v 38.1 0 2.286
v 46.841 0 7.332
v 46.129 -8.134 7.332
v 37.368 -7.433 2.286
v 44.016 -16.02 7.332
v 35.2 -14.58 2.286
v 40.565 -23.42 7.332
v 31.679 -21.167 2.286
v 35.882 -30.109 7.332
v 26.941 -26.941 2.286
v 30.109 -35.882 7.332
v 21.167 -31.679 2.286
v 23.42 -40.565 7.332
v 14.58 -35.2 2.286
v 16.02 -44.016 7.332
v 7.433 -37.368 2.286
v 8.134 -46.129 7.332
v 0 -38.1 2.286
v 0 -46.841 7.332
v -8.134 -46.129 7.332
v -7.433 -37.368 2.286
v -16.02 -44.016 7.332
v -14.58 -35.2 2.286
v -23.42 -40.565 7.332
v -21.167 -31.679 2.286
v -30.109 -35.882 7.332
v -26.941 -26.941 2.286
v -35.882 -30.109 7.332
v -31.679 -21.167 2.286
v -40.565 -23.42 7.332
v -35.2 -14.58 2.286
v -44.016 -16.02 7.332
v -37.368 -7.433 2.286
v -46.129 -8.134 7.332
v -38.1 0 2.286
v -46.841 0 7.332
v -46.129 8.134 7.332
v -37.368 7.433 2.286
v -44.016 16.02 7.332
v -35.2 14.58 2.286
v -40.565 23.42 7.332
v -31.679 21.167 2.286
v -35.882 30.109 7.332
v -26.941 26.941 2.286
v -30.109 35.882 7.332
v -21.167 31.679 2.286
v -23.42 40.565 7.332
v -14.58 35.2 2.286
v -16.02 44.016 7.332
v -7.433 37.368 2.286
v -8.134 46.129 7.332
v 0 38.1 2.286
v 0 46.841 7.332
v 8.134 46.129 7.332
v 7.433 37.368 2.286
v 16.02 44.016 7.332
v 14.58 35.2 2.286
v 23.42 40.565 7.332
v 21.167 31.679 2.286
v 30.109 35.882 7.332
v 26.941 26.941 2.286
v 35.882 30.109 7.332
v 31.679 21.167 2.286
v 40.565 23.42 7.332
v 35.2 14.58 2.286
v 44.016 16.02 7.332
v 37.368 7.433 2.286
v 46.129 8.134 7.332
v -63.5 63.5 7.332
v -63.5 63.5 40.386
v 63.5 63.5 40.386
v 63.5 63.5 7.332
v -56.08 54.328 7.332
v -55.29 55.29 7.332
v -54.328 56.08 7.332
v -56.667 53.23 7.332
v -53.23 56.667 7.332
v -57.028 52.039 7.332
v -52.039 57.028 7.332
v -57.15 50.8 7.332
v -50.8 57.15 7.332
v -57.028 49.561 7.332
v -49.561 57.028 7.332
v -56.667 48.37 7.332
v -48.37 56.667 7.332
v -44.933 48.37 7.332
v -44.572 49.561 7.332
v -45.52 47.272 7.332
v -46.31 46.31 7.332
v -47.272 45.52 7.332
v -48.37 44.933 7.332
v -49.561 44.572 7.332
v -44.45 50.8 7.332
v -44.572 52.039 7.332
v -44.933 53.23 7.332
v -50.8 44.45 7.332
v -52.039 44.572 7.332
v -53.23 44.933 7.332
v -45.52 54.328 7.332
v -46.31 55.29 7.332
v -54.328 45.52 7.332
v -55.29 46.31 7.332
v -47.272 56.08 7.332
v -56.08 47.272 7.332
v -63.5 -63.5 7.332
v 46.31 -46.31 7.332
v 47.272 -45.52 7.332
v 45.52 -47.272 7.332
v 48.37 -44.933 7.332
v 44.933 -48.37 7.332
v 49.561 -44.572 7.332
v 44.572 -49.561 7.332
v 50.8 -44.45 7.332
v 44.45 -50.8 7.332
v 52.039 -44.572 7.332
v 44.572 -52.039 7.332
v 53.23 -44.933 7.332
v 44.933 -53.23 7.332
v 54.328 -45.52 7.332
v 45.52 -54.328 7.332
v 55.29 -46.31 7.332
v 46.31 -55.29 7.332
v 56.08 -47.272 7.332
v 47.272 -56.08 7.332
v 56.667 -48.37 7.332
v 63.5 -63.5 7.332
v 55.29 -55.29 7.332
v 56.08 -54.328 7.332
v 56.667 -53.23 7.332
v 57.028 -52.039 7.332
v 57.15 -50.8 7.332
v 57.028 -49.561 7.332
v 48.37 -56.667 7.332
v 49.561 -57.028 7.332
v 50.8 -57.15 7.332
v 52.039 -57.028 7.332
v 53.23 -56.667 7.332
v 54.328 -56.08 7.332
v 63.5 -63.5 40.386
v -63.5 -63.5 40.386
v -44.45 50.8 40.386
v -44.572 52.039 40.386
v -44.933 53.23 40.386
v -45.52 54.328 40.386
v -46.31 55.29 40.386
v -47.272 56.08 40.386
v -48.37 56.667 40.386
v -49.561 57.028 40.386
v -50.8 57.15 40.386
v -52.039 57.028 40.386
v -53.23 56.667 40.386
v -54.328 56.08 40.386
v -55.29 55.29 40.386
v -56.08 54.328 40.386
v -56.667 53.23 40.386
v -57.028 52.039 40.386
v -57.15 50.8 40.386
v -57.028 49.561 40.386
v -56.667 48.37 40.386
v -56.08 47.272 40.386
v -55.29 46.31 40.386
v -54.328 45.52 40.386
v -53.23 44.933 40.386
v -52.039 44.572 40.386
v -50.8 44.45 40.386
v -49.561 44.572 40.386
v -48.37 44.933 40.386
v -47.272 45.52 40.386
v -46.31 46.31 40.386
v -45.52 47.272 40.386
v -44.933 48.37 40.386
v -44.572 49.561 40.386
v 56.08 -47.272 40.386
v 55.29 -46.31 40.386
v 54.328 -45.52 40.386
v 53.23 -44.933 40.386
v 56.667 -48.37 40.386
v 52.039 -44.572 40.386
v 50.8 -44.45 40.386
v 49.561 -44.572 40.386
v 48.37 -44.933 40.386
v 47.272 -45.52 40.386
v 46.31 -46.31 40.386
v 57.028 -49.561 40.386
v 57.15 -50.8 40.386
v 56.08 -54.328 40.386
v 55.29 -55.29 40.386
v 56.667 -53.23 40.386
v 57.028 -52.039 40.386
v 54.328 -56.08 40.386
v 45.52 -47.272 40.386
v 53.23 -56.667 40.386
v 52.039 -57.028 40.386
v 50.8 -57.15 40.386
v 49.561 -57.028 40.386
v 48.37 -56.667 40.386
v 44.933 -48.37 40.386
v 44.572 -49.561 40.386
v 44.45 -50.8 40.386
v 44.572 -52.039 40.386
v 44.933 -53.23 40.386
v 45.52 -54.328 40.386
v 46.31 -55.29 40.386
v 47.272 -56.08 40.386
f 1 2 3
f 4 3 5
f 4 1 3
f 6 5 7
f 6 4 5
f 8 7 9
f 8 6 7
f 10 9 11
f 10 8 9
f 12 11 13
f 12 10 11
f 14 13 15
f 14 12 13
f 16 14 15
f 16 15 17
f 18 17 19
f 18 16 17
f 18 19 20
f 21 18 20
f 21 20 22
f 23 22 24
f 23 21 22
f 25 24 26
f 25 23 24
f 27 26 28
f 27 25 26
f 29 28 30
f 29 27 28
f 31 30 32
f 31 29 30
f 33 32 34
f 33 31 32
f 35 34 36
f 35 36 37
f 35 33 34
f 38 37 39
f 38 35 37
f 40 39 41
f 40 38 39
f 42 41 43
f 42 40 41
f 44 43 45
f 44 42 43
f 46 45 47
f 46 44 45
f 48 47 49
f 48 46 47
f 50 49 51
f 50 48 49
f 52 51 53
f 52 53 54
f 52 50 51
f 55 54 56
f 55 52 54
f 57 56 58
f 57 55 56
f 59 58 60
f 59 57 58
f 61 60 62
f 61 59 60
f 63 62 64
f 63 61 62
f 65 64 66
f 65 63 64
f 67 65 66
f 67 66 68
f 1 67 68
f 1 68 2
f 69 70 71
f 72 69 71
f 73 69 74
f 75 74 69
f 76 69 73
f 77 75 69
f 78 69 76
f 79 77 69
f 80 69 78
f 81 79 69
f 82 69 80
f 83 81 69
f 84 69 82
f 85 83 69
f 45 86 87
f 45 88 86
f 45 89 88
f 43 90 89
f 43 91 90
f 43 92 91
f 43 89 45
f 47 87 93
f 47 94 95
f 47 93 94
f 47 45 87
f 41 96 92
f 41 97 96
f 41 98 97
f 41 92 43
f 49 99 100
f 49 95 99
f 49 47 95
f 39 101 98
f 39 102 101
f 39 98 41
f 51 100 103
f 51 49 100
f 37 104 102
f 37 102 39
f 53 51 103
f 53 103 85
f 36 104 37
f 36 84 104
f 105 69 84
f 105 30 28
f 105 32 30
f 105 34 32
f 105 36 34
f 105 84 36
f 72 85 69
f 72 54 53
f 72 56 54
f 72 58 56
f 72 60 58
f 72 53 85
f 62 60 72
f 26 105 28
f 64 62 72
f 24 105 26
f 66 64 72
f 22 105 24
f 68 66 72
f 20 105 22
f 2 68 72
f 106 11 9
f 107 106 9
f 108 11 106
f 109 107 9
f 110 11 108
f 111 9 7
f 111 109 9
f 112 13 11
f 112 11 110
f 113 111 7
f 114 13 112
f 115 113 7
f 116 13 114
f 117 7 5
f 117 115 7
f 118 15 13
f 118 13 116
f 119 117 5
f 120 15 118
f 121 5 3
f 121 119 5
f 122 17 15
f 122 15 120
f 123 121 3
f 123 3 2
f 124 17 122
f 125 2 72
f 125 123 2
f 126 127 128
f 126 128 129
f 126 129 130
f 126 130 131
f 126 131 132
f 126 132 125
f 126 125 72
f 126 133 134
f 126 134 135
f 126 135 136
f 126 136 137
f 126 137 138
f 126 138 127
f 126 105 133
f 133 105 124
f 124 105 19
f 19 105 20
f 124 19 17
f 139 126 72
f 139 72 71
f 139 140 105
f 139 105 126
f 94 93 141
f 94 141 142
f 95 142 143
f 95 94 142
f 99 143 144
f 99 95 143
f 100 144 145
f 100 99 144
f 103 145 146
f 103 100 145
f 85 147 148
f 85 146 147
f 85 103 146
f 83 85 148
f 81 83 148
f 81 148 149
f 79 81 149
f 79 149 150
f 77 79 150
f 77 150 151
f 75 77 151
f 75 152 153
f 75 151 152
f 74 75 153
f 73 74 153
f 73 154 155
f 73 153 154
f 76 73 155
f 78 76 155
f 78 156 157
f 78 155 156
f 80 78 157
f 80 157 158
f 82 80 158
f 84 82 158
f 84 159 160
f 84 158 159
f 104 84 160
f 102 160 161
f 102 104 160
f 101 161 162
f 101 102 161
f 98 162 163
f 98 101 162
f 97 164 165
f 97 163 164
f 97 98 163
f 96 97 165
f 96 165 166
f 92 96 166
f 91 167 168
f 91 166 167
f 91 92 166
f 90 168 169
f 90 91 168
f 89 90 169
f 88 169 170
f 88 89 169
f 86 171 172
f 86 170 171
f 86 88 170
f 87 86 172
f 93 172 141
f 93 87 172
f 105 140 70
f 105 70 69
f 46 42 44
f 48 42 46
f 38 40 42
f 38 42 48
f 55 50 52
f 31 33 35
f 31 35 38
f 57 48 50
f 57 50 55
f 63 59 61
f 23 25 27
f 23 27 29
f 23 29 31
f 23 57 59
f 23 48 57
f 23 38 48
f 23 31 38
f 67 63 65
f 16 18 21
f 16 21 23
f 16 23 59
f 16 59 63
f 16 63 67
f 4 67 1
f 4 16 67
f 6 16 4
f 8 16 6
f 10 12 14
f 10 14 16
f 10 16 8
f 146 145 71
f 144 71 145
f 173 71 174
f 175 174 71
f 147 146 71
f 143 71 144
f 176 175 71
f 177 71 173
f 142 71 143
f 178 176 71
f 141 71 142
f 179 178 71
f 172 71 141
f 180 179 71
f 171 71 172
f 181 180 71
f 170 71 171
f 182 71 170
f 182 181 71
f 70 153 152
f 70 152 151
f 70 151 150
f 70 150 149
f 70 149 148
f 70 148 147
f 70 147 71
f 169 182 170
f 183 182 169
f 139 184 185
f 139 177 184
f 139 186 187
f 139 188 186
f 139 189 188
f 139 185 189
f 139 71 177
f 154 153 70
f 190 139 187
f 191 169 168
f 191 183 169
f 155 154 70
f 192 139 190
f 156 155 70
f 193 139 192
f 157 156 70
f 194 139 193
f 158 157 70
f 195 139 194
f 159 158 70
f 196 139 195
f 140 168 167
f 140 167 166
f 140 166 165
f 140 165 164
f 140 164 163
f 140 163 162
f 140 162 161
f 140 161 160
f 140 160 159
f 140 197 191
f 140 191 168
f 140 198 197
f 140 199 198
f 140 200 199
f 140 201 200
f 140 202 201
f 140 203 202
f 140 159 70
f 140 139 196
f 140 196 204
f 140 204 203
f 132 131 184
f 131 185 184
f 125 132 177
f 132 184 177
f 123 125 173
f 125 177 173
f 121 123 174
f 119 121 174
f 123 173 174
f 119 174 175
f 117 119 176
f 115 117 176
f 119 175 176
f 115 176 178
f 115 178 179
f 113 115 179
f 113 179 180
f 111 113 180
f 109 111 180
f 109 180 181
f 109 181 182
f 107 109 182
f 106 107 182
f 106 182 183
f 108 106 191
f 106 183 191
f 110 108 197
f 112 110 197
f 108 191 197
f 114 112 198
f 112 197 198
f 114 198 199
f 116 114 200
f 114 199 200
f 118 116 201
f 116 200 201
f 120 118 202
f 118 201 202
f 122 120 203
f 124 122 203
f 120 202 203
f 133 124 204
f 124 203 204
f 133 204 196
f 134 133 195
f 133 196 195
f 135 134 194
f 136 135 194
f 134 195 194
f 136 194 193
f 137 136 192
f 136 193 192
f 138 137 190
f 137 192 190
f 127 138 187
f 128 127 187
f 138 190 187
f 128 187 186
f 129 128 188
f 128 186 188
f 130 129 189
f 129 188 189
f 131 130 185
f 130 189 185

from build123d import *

# Parameters (mm, degrees)
F2_DEPTH = 63.5
F4_R     = 6.35
F5_DEPTH = 50.8


with BuildPart() as f2:
    # F1 (on Front) → F2 (new body, symmetric)
    with BuildSketch(Plane.XZ):
        Polygon((-63.5, 40.386), (-63.5, 0), (63.5, 0), (63.5, 40.386), (0, 40.386), align=None)
    extrude(amount=F2_DEPTH, both=True)

    # F0 (on Front) → F3 (revolve, cut)
    with BuildSketch(Plane.XZ):
        Polygon((0, 2.286), (0, 0), (38.1, 0), (91.416501, 0), (91.416501, 7.332348), (50.8, 7.332348), (46.840532, 7.332348), (38.1, 2.286), align=None)
    revolve(axis=Axis((0, 0, 1.143), (0, 0, -1)), mode=Mode.SUBTRACT)

    # F4 (on Top) → F5 (cut, symmetric)
    with BuildSketch(Plane.XY):
        with Locations((-50.8, 50.8)):
            Circle(F4_R)
        with Locations((50.8, -50.8)):
            Circle(F4_R)
    extrude(amount=F5_DEPTH, both=True, mode=Mode.SUBTRACT)


solid = f2.part
